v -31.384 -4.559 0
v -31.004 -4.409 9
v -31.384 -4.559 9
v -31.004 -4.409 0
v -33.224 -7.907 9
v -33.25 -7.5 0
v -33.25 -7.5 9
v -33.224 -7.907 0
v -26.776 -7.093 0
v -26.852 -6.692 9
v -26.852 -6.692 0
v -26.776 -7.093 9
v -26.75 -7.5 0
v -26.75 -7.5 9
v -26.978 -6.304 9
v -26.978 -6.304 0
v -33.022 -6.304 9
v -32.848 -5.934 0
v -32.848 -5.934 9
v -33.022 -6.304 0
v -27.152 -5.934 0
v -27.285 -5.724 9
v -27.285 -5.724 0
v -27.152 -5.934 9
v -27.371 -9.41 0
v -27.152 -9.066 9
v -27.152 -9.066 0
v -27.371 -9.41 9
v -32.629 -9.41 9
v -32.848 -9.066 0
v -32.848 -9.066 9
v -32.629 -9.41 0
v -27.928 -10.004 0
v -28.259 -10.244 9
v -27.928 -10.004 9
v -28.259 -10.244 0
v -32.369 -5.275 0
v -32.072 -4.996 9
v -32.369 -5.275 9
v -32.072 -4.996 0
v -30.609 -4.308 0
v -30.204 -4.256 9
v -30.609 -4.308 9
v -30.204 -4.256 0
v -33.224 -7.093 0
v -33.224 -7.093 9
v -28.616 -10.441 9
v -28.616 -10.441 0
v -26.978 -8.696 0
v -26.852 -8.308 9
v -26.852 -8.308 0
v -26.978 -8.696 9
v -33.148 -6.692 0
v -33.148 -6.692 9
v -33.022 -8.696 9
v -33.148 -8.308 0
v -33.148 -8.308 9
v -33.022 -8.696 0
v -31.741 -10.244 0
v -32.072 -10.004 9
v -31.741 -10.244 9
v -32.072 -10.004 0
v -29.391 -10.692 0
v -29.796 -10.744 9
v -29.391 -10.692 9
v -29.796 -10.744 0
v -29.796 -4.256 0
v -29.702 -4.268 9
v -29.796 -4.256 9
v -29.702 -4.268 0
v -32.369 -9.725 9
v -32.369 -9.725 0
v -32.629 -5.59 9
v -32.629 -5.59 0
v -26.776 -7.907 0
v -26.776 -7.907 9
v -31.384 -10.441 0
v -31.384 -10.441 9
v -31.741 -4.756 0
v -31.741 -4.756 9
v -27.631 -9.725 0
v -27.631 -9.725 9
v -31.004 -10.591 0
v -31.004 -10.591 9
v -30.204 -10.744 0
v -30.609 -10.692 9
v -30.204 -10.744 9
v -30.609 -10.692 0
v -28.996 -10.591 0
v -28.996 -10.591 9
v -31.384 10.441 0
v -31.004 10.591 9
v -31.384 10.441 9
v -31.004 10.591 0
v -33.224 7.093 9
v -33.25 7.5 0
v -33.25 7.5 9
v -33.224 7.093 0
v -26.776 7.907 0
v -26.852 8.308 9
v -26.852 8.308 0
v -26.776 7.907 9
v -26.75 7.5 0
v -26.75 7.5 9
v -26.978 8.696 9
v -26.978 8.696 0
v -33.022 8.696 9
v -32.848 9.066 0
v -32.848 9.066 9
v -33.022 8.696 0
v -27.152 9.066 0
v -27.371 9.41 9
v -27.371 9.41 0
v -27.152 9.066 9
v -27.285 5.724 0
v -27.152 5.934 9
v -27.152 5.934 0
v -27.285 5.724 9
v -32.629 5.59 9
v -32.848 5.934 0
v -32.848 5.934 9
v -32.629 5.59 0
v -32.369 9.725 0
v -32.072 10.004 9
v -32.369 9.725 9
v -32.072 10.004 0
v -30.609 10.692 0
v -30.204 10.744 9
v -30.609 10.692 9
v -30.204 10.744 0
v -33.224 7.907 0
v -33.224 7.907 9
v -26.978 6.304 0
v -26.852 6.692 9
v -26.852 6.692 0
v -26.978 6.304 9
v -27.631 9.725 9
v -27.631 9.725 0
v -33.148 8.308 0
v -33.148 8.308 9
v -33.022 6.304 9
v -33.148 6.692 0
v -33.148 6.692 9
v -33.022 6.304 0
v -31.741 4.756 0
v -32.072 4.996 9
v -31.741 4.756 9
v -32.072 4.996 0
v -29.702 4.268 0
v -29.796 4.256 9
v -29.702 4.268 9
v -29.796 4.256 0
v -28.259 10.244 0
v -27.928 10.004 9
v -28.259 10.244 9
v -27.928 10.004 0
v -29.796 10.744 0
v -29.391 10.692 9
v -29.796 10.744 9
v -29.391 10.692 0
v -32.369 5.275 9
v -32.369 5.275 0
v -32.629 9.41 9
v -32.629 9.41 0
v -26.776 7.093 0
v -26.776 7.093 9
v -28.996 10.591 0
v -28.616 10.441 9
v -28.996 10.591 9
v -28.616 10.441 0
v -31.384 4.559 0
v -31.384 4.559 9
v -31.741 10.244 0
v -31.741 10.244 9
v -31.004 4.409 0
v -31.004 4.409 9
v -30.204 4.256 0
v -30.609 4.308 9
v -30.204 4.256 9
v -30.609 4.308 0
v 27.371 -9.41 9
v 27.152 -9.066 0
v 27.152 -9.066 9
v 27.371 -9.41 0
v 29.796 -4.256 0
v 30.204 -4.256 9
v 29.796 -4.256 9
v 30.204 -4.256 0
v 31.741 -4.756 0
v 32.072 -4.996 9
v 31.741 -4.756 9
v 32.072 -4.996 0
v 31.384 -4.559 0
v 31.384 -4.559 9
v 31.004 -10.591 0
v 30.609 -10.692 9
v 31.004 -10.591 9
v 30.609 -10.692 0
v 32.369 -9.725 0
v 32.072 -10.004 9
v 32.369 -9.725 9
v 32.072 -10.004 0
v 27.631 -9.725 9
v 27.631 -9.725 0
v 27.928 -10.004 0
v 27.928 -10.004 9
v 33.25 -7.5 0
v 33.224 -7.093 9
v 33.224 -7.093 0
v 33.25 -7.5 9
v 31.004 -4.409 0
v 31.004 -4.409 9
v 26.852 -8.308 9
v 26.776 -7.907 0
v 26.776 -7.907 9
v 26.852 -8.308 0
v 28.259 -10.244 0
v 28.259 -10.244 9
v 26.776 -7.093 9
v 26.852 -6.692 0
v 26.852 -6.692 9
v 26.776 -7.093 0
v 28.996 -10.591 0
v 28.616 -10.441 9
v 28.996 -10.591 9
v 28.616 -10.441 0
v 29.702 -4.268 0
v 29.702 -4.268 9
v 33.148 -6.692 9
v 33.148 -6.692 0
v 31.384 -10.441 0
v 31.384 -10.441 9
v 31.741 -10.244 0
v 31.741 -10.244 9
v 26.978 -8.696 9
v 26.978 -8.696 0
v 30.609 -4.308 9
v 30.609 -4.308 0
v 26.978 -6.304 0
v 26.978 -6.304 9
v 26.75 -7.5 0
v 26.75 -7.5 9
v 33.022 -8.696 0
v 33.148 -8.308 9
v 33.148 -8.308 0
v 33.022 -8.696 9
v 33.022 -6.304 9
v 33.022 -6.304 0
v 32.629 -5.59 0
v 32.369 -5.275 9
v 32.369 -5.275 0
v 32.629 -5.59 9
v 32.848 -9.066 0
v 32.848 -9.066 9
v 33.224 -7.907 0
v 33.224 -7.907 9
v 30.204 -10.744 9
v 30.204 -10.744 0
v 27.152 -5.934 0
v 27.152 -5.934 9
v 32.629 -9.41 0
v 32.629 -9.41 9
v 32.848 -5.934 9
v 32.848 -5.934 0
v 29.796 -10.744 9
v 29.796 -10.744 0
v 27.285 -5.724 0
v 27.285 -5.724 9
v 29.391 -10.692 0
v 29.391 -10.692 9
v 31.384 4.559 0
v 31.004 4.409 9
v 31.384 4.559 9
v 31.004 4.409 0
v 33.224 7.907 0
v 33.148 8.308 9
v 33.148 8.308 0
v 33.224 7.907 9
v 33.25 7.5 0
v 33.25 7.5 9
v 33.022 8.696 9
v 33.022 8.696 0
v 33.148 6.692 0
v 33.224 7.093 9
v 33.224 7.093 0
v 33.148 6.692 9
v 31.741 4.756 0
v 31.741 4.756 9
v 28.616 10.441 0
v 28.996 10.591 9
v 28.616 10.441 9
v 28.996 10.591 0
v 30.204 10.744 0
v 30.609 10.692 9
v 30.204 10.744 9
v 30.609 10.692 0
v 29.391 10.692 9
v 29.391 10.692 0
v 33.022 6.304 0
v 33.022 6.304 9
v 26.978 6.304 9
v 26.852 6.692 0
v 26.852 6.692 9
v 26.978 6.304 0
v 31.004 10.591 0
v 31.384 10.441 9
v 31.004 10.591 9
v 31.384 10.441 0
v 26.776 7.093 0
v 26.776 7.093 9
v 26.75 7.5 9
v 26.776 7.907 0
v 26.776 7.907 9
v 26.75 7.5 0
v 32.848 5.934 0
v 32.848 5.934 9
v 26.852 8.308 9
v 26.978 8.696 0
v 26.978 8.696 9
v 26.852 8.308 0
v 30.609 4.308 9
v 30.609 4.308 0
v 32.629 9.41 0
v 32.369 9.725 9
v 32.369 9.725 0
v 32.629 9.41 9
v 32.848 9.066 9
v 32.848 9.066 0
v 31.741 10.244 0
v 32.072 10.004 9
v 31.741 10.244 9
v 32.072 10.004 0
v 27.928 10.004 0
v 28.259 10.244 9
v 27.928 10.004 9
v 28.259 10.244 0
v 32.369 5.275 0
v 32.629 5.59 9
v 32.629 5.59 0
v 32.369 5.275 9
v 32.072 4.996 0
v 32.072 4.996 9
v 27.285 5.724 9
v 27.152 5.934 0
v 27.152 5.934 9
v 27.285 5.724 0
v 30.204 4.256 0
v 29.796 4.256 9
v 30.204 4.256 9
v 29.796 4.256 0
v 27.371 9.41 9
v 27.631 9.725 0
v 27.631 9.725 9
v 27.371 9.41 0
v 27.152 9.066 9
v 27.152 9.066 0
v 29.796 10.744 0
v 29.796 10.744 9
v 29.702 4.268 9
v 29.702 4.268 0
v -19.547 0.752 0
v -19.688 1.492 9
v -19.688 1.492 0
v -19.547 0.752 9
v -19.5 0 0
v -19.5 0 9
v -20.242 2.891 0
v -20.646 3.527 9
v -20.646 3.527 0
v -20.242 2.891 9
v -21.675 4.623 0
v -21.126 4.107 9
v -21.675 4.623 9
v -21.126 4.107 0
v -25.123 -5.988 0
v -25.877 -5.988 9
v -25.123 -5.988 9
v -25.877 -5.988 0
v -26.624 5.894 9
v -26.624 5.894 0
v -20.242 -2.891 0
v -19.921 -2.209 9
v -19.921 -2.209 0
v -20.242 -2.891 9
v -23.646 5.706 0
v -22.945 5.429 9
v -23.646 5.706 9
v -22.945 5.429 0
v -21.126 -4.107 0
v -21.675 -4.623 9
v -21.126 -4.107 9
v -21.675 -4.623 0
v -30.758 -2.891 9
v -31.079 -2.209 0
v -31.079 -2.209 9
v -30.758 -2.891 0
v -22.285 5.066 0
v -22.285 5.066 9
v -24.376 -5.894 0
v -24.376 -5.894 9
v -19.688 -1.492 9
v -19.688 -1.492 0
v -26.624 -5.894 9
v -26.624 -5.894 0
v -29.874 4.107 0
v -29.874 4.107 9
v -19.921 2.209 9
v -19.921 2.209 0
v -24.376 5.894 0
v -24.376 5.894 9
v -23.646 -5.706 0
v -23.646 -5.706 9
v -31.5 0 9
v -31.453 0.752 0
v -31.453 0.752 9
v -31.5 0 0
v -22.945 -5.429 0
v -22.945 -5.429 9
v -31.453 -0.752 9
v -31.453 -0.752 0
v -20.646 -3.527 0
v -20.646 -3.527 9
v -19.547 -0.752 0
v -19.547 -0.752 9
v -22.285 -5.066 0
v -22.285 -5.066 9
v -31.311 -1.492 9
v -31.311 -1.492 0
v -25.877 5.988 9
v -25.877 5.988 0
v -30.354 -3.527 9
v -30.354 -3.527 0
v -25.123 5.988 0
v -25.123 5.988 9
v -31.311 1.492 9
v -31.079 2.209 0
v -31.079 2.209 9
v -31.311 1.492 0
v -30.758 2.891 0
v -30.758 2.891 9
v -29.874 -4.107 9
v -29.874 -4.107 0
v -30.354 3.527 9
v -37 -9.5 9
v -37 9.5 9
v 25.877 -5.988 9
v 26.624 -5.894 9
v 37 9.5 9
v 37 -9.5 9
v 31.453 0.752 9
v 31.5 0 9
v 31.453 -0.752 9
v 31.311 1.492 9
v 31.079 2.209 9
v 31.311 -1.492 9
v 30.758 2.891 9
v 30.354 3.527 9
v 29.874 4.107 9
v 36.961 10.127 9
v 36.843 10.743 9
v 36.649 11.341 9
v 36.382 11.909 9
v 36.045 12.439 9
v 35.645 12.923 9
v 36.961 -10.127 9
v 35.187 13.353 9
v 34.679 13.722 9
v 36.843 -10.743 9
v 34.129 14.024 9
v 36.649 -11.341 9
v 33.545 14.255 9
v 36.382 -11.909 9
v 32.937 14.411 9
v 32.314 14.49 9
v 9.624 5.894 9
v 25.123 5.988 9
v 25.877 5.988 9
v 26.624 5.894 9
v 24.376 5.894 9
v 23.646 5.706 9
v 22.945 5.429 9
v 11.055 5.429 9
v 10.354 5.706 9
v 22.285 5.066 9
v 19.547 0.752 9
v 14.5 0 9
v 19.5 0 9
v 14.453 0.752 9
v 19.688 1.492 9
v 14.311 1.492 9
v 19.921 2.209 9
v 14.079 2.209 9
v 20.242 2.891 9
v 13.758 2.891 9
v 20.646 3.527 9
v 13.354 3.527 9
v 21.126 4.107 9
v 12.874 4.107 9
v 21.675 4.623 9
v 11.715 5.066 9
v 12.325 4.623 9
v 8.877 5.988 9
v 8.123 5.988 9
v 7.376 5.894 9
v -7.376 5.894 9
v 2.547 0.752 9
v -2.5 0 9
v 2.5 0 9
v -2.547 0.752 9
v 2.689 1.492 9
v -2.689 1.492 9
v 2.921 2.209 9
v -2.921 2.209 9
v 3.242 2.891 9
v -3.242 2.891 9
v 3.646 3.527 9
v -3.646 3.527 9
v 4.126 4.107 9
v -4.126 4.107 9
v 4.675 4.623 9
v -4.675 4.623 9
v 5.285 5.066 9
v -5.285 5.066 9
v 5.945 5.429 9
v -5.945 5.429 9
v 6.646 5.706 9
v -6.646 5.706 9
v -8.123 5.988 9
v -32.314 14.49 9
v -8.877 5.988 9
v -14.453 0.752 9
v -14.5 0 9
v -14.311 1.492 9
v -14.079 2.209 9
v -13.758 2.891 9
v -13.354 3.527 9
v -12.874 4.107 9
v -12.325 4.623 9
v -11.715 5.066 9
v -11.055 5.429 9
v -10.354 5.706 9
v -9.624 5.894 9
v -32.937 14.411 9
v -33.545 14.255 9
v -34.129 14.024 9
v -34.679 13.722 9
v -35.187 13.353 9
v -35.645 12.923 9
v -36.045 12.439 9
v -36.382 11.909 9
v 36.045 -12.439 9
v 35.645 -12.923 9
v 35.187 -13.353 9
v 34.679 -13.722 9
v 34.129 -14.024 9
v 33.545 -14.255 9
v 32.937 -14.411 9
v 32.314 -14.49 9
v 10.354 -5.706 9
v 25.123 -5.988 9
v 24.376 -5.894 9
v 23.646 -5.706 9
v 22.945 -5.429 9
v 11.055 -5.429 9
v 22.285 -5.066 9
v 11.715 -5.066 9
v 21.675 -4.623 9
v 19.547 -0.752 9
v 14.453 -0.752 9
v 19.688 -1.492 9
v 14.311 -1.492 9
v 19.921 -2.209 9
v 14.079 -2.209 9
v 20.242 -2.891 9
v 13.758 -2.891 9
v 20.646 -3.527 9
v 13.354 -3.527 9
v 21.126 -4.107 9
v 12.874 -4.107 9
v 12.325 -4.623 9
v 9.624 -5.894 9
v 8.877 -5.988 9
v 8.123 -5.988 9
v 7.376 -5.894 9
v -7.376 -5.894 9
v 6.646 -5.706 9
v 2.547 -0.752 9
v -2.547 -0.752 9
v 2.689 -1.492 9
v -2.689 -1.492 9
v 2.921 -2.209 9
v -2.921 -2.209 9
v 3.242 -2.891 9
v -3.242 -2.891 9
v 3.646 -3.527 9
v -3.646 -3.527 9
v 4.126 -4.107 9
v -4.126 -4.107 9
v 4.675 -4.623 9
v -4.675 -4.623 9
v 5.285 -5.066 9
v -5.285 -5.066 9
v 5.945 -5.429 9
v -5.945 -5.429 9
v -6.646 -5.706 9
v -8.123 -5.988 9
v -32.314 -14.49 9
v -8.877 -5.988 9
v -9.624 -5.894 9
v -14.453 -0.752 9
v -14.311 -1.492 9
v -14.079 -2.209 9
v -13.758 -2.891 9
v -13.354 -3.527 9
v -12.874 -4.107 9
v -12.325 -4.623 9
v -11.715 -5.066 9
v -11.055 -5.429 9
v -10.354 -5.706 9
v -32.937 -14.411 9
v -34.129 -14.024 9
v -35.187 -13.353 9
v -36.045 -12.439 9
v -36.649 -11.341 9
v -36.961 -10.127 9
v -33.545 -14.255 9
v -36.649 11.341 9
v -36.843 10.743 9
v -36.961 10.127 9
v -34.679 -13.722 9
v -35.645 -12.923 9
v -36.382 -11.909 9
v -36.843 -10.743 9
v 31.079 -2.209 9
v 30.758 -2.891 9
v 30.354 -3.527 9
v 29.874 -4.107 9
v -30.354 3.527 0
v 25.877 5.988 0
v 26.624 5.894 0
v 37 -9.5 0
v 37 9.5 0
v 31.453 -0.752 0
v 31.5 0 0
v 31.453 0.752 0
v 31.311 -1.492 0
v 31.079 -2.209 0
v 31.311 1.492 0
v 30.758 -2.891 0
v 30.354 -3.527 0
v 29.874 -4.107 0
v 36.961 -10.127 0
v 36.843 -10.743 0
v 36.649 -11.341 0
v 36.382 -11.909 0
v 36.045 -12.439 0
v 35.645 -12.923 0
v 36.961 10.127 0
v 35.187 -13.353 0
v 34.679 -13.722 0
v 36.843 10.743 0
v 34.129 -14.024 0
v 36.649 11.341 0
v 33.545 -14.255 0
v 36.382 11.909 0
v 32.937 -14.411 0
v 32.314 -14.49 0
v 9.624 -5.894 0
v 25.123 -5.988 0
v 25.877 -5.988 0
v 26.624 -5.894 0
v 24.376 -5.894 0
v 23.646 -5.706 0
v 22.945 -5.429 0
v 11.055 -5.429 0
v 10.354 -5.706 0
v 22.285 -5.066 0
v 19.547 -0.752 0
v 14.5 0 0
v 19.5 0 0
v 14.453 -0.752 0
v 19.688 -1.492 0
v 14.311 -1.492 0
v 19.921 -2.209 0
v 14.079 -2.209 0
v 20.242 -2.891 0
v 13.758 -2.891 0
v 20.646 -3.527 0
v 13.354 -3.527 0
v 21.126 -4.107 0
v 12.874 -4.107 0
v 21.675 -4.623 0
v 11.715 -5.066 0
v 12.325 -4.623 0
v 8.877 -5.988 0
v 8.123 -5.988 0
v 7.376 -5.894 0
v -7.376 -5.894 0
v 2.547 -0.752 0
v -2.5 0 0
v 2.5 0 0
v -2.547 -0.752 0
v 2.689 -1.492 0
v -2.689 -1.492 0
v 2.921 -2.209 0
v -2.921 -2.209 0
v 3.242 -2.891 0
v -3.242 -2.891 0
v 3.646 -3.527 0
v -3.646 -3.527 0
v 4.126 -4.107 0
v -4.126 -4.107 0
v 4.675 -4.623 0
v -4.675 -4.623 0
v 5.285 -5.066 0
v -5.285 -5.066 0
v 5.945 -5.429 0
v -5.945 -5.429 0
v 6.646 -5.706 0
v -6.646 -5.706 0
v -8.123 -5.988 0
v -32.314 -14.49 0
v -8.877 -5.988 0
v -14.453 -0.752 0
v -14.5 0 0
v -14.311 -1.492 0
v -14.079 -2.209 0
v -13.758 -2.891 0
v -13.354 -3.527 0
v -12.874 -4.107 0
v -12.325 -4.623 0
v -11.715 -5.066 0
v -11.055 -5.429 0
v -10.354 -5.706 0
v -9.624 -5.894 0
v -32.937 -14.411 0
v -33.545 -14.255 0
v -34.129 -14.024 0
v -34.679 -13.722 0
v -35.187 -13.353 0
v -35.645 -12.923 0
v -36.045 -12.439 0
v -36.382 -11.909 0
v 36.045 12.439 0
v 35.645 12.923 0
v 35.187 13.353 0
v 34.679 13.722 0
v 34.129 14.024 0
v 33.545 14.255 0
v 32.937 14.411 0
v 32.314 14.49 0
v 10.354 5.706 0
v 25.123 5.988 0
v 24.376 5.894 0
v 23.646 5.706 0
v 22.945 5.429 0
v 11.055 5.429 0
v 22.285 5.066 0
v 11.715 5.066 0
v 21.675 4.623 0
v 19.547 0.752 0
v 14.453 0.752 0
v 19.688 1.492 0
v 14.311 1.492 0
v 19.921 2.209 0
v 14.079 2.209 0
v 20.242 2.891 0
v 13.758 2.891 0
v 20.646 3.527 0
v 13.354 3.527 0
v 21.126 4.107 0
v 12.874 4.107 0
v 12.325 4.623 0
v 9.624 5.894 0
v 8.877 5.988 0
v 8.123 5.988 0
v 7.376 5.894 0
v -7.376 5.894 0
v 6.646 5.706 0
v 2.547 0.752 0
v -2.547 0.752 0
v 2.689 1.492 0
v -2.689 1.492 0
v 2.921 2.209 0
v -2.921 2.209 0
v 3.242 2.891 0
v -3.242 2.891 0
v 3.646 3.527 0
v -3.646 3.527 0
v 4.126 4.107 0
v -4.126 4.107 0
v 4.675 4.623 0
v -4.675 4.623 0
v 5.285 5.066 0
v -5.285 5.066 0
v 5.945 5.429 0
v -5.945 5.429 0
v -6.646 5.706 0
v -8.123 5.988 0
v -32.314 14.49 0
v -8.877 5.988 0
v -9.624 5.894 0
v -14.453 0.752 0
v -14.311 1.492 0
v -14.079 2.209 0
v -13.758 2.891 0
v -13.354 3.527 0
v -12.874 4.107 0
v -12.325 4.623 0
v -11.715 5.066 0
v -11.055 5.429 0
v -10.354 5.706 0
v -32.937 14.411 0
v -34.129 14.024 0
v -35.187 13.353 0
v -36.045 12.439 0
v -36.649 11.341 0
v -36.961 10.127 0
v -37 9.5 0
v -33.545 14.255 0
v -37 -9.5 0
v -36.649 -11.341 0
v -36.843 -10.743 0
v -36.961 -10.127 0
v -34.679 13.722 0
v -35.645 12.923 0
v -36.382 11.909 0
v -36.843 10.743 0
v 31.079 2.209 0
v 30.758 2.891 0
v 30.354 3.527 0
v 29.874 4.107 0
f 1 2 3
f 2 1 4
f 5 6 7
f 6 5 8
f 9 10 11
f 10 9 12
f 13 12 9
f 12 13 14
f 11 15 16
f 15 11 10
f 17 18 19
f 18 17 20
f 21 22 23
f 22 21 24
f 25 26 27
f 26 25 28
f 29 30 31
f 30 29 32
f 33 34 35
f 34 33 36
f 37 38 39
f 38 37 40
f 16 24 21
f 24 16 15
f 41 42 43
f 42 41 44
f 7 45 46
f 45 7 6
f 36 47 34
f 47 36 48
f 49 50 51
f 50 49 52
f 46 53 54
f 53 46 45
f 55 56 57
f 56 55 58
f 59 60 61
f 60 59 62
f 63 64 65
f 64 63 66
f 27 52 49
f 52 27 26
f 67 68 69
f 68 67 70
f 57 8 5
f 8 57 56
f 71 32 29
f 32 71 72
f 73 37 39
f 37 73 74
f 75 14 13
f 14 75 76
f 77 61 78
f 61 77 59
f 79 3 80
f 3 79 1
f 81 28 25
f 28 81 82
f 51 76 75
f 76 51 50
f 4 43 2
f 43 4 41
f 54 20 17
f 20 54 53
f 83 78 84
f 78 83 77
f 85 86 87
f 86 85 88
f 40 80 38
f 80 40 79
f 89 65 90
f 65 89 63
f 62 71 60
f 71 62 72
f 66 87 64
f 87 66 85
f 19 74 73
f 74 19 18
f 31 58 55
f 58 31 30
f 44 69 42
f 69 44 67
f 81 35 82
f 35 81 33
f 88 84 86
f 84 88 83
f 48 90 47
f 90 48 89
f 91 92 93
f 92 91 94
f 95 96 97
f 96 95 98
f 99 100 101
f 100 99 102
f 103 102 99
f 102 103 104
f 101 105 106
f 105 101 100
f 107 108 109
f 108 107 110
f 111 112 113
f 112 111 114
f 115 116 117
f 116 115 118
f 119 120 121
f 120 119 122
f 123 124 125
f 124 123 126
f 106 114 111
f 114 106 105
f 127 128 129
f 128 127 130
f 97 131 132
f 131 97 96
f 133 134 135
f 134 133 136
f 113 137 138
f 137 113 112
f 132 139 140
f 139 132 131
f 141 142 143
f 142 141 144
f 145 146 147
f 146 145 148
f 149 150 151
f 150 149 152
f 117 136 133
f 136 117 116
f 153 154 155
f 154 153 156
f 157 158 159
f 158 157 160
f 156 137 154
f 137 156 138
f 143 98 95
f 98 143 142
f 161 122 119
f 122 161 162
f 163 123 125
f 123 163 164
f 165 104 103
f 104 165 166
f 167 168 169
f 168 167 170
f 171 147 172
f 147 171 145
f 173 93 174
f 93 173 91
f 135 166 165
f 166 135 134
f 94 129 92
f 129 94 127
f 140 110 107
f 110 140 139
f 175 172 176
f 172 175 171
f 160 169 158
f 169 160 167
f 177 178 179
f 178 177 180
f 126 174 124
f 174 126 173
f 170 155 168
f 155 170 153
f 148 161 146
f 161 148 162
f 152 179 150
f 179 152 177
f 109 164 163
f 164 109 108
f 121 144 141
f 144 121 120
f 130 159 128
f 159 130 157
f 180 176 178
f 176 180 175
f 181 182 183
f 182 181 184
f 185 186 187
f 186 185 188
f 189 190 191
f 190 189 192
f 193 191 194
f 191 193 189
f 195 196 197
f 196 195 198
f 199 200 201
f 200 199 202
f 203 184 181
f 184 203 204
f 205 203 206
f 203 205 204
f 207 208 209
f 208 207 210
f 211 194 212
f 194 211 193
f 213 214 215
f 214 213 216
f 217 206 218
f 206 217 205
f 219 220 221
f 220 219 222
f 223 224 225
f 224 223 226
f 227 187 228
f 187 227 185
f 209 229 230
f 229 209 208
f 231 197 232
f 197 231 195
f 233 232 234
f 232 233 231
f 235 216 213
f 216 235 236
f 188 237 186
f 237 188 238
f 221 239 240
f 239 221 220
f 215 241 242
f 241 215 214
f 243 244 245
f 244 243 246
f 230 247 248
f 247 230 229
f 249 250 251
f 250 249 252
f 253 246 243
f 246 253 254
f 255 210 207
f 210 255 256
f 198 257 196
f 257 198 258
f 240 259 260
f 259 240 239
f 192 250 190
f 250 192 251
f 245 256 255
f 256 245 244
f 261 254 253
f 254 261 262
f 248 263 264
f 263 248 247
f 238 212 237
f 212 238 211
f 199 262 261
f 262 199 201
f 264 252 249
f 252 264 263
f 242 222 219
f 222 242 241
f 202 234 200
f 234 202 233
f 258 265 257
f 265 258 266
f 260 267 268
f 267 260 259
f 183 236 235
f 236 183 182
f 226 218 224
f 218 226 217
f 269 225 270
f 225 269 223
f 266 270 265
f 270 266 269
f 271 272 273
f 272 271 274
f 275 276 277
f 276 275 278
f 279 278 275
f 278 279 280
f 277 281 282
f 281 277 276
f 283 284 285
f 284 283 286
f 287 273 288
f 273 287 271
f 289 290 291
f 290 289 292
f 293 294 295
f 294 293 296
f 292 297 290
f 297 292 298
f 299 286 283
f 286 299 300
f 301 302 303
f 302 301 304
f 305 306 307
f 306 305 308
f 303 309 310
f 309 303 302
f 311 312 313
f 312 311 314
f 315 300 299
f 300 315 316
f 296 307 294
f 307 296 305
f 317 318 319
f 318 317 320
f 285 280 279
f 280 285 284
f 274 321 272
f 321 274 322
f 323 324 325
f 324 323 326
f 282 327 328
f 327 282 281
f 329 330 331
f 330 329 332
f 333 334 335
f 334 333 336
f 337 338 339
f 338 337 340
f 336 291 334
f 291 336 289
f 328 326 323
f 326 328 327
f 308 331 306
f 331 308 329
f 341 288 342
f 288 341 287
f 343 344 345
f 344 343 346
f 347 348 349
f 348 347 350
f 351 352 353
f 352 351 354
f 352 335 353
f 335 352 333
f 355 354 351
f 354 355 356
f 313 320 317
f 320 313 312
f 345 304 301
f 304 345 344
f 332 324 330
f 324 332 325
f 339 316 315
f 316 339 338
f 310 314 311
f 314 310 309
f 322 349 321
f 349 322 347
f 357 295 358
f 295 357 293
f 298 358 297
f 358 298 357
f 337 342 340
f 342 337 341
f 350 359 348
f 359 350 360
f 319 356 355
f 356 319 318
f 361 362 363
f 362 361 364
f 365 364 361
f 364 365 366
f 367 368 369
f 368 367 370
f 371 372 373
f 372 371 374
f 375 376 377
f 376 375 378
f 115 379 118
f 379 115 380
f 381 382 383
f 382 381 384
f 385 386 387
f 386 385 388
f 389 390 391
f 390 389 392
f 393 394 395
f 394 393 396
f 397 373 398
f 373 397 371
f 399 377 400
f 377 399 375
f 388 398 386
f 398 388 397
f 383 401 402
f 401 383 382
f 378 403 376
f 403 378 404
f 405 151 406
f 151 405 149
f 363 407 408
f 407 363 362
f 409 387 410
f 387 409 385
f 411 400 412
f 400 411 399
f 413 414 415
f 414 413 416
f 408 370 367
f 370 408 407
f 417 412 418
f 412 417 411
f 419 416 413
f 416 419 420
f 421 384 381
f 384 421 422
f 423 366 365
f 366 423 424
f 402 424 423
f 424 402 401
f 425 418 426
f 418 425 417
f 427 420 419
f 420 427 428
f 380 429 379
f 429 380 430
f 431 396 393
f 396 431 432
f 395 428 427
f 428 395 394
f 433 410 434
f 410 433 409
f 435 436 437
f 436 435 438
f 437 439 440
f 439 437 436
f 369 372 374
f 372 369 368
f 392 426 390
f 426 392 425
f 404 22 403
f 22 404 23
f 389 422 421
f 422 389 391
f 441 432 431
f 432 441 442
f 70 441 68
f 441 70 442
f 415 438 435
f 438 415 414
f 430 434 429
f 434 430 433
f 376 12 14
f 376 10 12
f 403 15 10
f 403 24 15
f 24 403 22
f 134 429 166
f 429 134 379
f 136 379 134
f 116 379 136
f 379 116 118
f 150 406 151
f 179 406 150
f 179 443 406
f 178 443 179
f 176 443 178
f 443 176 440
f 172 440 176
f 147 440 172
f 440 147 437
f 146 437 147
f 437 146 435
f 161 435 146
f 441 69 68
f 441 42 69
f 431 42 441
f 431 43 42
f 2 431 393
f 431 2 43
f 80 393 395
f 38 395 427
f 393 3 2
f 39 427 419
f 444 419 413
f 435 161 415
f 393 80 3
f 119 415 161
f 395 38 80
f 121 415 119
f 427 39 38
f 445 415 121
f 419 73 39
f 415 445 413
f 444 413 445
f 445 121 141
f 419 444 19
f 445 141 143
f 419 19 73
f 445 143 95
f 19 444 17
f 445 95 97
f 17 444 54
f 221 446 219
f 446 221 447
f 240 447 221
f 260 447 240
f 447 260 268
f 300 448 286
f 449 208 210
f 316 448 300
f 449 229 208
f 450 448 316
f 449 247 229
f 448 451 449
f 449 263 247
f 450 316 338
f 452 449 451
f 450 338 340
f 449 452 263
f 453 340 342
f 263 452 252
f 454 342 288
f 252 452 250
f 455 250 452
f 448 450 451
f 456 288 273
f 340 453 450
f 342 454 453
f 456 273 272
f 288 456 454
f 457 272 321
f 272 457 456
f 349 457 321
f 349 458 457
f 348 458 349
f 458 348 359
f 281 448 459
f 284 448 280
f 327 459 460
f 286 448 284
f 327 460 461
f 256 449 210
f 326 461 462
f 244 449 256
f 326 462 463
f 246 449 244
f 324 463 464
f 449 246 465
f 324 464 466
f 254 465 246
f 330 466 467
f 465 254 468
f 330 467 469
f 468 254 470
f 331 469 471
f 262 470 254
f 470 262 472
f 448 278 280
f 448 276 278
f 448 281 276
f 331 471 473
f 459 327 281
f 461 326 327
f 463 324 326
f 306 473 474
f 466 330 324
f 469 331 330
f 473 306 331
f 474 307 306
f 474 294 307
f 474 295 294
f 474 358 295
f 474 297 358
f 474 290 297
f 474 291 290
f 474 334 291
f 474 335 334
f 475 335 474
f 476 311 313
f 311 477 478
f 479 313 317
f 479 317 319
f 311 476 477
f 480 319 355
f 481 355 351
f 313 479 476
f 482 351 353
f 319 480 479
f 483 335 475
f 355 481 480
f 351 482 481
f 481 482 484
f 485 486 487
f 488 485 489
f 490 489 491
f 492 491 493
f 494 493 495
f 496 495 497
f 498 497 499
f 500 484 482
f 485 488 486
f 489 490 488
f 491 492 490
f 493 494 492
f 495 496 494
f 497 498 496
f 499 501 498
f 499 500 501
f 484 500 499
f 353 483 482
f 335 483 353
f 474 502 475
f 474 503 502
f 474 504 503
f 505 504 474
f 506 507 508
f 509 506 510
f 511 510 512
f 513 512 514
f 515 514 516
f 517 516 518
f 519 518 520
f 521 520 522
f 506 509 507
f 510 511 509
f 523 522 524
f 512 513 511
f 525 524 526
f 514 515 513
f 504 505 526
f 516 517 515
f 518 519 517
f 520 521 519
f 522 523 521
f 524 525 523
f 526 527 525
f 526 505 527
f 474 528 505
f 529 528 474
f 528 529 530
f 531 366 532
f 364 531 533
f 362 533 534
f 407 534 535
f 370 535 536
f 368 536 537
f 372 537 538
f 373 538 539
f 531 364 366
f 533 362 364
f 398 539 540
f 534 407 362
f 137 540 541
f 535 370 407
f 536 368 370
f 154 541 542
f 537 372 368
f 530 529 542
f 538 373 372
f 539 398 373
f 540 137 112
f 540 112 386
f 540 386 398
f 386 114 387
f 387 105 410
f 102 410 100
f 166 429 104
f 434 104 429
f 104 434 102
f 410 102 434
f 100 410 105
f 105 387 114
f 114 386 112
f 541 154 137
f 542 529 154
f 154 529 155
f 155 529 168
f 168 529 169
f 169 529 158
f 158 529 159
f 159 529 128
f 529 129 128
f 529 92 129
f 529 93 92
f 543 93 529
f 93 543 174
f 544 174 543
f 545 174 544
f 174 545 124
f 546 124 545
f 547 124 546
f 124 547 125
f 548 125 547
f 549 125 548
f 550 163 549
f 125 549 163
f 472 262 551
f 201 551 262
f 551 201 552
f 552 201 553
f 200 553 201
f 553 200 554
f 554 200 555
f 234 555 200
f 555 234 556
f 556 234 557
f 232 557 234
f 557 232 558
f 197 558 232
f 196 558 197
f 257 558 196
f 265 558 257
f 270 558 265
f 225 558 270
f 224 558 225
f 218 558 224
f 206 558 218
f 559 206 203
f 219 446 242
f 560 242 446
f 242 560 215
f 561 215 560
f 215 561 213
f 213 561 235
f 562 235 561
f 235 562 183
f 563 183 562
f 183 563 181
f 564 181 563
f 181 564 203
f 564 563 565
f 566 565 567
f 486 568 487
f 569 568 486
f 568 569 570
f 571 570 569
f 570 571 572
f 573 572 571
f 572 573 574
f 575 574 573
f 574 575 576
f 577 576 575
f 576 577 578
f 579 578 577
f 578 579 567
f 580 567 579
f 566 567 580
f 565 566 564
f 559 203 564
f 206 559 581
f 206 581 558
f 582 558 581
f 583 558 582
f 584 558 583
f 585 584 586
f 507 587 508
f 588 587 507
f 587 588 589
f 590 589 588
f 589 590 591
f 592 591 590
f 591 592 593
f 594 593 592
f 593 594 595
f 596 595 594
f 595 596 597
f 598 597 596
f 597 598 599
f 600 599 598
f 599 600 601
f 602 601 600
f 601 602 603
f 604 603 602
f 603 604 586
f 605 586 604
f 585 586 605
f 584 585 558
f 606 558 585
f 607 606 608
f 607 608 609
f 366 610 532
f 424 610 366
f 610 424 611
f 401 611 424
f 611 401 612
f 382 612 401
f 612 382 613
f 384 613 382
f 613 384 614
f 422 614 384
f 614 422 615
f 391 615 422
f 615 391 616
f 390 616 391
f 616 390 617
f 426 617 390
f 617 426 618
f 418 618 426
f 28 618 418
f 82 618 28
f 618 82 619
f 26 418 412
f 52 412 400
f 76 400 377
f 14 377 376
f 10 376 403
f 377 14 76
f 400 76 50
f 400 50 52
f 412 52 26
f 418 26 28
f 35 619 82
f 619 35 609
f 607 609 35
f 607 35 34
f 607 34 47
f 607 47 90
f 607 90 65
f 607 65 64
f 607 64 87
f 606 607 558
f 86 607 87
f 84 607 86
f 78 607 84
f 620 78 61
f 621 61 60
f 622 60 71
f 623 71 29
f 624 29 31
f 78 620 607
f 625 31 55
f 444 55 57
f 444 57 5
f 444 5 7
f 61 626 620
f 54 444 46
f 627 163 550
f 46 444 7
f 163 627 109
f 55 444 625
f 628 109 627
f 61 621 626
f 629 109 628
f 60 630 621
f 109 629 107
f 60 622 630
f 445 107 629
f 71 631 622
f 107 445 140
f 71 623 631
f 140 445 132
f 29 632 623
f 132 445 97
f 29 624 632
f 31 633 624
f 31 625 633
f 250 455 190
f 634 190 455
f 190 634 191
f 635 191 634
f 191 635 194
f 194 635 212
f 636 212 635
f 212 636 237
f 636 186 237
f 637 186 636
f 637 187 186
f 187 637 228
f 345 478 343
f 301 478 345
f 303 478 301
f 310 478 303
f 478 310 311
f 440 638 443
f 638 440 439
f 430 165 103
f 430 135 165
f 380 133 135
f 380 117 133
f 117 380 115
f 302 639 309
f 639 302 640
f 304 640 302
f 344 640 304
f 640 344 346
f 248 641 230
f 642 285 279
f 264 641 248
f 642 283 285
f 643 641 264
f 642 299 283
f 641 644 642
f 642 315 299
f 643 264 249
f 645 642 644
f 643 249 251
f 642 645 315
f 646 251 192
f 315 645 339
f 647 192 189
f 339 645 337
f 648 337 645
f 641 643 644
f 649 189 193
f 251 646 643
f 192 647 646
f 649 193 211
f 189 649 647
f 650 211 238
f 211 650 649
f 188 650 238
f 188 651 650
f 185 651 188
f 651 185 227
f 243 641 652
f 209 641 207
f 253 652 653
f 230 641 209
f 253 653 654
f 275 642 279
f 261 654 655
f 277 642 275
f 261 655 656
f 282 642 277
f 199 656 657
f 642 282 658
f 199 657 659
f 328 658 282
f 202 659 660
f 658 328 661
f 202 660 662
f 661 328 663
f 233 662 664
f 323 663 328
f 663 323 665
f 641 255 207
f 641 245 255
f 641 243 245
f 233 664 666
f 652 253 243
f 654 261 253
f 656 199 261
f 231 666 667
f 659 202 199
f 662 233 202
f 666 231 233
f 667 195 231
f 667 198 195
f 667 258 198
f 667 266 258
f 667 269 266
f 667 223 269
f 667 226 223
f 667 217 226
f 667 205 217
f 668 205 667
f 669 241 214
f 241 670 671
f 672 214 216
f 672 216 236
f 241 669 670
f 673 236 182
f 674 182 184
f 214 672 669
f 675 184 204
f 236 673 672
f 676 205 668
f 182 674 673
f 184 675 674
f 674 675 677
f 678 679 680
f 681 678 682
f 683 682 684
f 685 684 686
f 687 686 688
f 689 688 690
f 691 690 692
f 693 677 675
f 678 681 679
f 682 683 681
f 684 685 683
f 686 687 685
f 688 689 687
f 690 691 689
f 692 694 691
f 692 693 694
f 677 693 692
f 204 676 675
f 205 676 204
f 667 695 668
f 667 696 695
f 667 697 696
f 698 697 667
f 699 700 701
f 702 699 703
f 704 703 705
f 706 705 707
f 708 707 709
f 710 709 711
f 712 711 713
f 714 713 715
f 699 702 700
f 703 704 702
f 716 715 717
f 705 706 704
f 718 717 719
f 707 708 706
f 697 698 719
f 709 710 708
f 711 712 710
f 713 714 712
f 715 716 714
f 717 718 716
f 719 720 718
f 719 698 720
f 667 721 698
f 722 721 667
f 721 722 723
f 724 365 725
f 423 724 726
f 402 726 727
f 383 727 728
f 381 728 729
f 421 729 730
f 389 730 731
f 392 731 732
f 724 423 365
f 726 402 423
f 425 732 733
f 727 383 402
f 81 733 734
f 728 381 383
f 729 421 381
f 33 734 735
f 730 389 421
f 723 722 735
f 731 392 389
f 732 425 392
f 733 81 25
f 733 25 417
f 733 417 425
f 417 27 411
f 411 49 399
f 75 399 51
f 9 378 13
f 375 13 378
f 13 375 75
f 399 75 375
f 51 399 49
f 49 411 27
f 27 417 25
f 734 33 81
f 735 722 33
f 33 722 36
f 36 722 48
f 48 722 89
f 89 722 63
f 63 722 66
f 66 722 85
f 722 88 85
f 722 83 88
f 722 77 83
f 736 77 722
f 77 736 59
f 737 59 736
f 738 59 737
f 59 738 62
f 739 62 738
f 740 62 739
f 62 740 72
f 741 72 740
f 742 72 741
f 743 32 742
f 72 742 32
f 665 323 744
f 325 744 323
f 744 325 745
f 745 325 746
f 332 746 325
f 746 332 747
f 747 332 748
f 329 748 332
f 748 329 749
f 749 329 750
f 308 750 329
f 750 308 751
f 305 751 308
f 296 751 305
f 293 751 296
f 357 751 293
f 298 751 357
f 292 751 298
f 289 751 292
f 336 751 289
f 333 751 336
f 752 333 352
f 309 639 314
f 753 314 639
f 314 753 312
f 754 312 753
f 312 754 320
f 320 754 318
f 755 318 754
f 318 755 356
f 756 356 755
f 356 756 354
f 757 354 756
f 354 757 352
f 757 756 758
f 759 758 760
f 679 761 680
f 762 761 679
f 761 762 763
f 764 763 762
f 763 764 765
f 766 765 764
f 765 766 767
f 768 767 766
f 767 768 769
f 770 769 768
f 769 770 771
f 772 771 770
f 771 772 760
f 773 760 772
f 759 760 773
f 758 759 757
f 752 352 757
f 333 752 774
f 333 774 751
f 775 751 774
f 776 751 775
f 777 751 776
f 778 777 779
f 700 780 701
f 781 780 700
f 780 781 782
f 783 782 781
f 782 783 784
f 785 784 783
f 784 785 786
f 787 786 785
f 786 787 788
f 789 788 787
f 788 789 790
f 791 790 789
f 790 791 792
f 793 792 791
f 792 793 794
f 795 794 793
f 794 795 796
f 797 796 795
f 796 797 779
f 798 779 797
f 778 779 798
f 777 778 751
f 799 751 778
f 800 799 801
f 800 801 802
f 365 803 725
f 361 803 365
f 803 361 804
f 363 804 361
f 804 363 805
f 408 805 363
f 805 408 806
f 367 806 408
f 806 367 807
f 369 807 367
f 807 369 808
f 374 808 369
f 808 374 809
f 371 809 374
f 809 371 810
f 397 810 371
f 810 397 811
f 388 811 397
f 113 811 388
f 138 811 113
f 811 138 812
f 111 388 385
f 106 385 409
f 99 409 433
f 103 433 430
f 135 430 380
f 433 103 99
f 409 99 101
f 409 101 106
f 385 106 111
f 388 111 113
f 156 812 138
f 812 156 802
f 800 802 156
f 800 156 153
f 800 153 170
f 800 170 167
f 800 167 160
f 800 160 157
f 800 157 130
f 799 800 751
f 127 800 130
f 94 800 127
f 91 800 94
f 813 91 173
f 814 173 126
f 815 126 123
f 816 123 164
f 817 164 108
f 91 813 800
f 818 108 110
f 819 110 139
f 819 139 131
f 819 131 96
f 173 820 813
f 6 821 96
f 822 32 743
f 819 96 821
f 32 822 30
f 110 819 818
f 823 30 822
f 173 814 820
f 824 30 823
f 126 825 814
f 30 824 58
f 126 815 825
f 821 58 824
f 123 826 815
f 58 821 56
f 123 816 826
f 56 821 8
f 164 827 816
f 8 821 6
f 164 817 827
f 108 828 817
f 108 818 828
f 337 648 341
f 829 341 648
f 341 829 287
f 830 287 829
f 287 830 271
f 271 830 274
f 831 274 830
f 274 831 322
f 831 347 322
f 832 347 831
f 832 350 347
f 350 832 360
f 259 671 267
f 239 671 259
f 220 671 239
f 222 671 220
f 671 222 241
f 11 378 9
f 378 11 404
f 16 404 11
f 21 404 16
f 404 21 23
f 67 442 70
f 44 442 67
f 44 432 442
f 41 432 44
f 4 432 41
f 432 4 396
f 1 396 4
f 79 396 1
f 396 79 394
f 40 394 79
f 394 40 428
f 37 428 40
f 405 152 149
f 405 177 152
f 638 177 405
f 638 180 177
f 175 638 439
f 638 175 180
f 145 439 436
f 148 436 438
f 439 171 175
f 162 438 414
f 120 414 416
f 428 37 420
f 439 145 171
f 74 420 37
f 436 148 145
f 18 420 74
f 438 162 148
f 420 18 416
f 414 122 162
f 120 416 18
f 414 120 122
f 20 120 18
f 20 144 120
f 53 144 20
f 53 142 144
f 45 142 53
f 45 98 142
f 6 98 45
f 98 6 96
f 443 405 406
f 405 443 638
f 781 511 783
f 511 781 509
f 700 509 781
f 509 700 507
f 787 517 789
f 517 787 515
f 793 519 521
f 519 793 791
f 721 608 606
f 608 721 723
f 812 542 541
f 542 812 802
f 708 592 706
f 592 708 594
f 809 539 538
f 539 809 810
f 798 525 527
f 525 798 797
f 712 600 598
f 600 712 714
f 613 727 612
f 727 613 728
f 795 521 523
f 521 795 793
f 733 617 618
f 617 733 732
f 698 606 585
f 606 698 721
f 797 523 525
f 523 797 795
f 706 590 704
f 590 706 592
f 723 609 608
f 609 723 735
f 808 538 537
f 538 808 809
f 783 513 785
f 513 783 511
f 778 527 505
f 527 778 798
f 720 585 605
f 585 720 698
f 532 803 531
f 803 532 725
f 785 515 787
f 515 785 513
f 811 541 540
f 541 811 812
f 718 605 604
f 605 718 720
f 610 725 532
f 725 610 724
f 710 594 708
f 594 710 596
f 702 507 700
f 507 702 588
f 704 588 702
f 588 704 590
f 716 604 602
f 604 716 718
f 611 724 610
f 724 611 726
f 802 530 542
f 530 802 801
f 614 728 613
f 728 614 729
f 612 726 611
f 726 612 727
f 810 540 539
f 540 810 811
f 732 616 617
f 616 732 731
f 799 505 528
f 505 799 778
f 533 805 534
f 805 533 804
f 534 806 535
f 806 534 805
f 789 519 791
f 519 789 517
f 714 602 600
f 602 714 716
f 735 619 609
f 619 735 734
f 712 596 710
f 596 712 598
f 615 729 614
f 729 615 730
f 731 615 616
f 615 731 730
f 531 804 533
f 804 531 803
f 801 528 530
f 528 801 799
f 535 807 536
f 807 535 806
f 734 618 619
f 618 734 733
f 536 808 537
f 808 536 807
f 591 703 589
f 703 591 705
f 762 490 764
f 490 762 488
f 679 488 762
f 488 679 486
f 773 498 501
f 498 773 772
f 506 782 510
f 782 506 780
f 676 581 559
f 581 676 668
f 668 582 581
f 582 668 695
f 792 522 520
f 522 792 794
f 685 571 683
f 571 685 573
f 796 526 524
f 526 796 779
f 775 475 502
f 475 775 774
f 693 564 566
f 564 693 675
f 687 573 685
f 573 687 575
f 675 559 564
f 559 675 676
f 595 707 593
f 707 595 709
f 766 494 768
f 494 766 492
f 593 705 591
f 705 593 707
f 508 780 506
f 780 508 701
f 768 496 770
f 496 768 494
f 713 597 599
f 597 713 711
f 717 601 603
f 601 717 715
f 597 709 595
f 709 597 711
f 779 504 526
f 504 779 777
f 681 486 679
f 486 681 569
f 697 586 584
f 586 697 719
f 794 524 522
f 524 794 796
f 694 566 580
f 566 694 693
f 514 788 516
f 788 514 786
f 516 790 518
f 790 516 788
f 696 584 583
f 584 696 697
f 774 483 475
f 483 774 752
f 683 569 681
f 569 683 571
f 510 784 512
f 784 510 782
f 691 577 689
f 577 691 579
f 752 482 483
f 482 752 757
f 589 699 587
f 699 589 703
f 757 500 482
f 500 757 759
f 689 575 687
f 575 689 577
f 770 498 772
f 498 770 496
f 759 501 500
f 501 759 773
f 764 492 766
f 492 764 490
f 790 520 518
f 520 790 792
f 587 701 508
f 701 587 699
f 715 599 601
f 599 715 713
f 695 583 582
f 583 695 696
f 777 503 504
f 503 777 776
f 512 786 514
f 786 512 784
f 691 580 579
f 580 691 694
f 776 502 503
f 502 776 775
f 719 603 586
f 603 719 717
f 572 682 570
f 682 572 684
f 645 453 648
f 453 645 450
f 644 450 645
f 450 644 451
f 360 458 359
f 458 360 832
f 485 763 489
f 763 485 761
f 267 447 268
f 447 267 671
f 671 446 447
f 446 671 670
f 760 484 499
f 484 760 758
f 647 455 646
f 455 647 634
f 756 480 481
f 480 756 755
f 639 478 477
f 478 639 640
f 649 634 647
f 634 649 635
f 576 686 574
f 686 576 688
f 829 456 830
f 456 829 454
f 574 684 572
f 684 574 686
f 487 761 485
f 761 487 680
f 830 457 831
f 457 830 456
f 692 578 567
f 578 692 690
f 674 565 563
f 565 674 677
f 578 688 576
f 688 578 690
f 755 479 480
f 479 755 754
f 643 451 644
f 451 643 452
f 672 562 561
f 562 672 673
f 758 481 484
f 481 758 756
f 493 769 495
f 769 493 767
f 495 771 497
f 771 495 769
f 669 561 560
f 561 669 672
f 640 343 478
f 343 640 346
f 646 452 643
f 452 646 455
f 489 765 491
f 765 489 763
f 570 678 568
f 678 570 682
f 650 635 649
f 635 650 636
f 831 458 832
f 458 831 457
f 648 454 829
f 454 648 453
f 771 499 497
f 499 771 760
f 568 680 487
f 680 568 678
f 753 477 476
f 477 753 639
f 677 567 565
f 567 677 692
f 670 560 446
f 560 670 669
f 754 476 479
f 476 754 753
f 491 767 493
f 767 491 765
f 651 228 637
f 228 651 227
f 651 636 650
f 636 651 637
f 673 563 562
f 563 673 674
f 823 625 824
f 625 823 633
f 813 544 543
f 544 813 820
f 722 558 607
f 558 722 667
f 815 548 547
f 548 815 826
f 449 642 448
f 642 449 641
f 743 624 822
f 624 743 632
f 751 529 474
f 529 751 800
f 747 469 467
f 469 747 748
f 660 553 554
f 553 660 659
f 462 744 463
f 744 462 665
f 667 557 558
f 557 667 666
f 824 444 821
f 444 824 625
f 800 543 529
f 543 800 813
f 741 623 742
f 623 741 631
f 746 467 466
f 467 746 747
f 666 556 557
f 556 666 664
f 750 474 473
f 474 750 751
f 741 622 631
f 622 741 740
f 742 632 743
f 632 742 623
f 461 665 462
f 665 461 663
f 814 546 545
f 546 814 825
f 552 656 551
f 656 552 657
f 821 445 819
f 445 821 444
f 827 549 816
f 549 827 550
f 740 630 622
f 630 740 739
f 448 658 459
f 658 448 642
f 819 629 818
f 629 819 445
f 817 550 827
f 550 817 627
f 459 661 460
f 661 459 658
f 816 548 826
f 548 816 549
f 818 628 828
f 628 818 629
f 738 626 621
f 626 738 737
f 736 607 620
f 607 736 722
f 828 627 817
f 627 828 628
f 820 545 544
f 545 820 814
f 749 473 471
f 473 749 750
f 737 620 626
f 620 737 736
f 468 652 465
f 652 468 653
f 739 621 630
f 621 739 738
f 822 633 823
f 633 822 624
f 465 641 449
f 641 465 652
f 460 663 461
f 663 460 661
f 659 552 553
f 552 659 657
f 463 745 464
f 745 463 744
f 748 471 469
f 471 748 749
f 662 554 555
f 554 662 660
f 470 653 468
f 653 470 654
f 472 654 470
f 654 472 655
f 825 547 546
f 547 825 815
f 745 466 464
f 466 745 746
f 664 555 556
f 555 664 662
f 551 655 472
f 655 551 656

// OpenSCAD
$fn = 50;


difference() {
	union() {
		hull() {
			translate(v = [-32.0000000000, 9.5000000000, 0]) {
				cylinder(h = 9, r = 5);
			}
			translate(v = [32.0000000000, 9.5000000000, 0]) {
				cylinder(h = 9, r = 5);
			}
			translate(v = [-32.0000000000, -9.5000000000, 0]) {
				cylinder(h = 9, r = 5);
			}
			translate(v = [32.0000000000, -9.5000000000, 0]) {
				cylinder(h = 9, r = 5);
			}
		}
	}
	union() {
		#translate(v = [-30.0000000000, -7.5000000000, -100.0000000000]) {
			cylinder(h = 200, r = 3.2500000000);
		}
		#translate(v = [-30.0000000000, 7.5000000000, -100.0000000000]) {
			cylinder(h = 200, r = 3.2500000000);
		}
		#translate(v = [30.0000000000, -7.5000000000, -100.0000000000]) {
			cylinder(h = 200, r = 3.2500000000);
		}
		#translate(v = [30.0000000000, 7.5000000000, -100.0000000000]) {
			cylinder(h = 200, r = 3.2500000000);
		}
		#translate(v = [-25.5000000000, 0, 0]) {
			cylinder(h = 9, r = 6.0000000000);
		}
		#translate(v = [-8.5000000000, 0, 0]) {
			cylinder(h = 9, r = 6.0000000000);
		}
		#translate(v = [8.5000000000, 0, 0]) {
			cylinder(h = 9, r = 6.0000000000);
		}
		#translate(v = [25.5000000000, 0, 0]) {
			cylinder(h = 9, r = 6.0000000000);
		}
	}
}
